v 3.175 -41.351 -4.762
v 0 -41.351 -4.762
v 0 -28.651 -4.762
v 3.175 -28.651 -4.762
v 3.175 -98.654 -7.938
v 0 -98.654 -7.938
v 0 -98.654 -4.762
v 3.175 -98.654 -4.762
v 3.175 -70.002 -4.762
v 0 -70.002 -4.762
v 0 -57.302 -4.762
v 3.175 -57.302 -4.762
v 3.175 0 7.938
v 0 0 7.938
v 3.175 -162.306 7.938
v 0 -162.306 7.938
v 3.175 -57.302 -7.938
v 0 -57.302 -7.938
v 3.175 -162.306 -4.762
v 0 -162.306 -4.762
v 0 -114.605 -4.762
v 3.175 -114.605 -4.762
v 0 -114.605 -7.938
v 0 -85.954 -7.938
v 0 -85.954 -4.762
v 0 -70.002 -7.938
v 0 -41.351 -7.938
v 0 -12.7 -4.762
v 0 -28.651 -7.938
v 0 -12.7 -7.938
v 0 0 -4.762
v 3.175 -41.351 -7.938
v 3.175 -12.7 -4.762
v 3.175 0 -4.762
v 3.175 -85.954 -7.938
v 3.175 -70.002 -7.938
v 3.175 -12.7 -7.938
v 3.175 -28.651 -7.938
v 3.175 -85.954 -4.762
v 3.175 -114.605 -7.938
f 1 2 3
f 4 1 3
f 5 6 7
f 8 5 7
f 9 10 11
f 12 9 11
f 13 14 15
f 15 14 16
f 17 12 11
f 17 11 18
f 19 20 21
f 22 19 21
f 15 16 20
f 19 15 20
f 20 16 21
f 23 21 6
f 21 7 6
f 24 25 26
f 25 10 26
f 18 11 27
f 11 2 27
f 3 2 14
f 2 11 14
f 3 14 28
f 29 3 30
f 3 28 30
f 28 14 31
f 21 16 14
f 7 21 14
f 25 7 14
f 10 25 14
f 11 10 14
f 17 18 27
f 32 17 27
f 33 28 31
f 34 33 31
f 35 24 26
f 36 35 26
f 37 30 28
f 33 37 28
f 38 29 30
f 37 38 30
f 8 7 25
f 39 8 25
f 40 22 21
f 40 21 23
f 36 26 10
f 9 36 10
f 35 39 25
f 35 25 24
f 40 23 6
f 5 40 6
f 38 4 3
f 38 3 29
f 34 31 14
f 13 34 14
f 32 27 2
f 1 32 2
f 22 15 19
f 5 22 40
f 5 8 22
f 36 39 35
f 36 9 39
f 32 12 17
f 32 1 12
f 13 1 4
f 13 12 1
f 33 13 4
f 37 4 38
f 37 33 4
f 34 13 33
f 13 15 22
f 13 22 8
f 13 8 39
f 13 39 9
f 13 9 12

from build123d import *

# Parameters (mm, degrees)
BOSS_EXTRUDE1_DEPTH = 3.175


with BuildPart() as part:
    # Sketch1 → Boss-Extrude1 (new body)
    with BuildSketch(Plane(origin=(0, 0, 0), x_dir=(0, 0, -1), z_dir=(1, 0, 0))):
        Polygon((-7.9375, 0), (-7.9375, -162.306), (4.7625, -162.306), (4.7625, -155.956), (4.7625, -143.256), (4.7625, -127.3048), (4.7625, -114.6048), (7.9375, -114.6048), (7.9375, -98.6536), (4.7625, -98.6536), (4.7625, -85.9536), (7.9375, -85.9536), (7.9375, -70.0024), (4.7625, -70.0024), (4.7625, -57.3024), (7.9375, -57.3024), (7.9375, -41.3512), (4.7625, -41.3512), (4.7625, -28.6512), (7.9375, -28.6512), (7.9375, -12.7), (4.7625, -12.7), (4.7625, 0), align=None)
    extrude(amount=BOSS_EXTRUDE1_DEPTH)


solid = part.part
